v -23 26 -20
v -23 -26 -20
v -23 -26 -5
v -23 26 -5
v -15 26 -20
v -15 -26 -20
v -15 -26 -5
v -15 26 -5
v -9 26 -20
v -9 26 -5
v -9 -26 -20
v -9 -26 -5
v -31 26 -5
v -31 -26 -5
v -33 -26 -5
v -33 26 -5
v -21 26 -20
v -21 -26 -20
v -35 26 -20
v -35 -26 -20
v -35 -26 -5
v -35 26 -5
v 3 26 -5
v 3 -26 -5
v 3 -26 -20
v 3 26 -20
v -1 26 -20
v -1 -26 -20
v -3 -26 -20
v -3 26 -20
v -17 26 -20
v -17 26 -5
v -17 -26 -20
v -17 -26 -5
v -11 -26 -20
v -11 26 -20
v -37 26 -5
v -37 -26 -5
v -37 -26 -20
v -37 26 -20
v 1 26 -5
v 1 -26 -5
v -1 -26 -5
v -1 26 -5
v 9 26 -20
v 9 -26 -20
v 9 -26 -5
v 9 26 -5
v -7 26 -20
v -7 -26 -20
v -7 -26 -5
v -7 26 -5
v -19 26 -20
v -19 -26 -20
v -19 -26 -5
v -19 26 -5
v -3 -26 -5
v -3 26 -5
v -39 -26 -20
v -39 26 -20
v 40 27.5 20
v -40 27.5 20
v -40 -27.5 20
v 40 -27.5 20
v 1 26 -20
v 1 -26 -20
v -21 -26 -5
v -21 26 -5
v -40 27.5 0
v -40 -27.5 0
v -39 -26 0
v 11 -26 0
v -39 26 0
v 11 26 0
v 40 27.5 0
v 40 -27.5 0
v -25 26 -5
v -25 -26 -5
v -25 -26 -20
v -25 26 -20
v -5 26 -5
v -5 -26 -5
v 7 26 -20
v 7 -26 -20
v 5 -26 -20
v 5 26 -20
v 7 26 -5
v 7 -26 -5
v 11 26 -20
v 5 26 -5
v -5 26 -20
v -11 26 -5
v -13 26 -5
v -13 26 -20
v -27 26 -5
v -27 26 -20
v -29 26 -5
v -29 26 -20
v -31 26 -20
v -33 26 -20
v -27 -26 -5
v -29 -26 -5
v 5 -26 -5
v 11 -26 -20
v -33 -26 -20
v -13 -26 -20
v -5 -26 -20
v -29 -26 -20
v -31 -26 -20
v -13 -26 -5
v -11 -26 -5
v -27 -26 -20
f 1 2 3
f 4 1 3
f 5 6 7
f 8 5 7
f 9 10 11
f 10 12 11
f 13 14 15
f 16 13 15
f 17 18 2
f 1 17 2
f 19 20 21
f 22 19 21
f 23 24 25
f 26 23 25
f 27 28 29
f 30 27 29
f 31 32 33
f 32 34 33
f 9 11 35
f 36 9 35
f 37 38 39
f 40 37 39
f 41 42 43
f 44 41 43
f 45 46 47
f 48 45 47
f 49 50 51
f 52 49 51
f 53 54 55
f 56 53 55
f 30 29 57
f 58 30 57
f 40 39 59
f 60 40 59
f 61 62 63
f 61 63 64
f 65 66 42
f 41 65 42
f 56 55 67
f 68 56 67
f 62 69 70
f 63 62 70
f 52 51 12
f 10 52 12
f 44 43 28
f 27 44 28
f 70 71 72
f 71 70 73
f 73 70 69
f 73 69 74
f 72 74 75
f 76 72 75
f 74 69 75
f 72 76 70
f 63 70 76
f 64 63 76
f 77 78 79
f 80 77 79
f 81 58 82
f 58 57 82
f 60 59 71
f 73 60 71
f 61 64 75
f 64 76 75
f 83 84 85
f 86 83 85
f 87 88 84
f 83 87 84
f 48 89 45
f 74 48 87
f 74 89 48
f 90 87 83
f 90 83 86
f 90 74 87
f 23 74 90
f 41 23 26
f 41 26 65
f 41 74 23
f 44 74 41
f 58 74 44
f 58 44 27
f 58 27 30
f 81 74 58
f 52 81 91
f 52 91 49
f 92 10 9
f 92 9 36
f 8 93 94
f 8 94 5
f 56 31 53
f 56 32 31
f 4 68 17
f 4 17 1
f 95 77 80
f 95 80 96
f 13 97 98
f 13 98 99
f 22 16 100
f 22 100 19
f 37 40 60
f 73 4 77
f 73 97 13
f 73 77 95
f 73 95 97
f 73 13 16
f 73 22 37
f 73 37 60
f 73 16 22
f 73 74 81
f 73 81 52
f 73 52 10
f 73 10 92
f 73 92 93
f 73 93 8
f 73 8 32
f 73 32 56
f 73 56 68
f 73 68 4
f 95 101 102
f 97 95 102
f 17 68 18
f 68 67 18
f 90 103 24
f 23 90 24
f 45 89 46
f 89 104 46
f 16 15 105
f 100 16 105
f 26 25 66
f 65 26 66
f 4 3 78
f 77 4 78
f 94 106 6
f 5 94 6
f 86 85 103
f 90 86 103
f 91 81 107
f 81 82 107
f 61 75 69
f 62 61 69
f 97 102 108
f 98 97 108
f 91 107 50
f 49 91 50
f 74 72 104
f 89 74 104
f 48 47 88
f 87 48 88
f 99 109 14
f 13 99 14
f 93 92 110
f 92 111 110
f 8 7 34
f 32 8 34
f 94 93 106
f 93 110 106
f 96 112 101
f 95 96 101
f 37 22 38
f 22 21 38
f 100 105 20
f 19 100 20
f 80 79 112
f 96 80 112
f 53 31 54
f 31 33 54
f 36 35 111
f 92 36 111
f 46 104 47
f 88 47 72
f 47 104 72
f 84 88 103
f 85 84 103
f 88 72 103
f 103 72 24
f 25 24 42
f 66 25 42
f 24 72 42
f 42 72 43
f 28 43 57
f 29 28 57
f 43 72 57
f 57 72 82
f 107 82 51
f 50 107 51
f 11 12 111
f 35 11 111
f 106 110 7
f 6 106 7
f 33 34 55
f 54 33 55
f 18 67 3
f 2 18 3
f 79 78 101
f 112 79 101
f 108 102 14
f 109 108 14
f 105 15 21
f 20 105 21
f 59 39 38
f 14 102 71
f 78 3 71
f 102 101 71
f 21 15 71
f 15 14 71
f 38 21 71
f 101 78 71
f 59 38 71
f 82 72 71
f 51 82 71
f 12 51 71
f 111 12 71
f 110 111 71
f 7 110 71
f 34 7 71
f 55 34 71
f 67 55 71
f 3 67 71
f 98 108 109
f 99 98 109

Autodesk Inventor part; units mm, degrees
ref_plane "YZ Plane" through (0, 0, 0) normal (1, 0, 0) x (0, 1, 0)
ref_plane "XZ Plane" through (0, 0, 0) normal (0, 1, 0) x (-1, 0, 0)
ref_plane "XY Plane" through (0, 0, 0) normal (0, 0, 1) x (1, 0, 0)
sketch "Szkic1" plane through (0, 0, 0) normal (0, 0, 1) x (1, 0, 0)
  line L0 (-40, -27.5) -> (40, -27.5)
  line L1 (40, -27.5) -> (40, 27.5)
  line L2 (40, 27.5) -> (-40, 27.5)
  line L3 (-40, 27.5) -> (-40, -27.5)
  line L4 (-40, -27.5) -> (40, 27.5) construction
  line L5 (40, -27.5) -> (-40, 27.5) construction
  point P0 (0, 0)
  dimension "d0" = 80
  dimension "d1" = 55
extrude "Wyciągnięcie proste1" add sketch "Szkic1" along normal blind 20
sketch "Szkic2" plane through (0, 0, 0) normal (0, 1, 0) x (-1, 0, 0)
  line L0 (39, 0) -> (-11, 0)
  line L1 (-11, 0) -> (-11, -20)
  line L2 (-11, -20) -> (39, -20)
  line L3 (39, -20) -> (39, 0)
  line L4 (40, 0) -> (40, 20) projected
  line L5 (40, 0) -> (-40, 0) projected
  point P0 (0, 0)
  dimension "d4" = 50
  dimension "d5" = 20
  dimension "d6" = 1
extrude "Wyciągnięcie proste2" add sketch "Szkic2" along normal mid plane 52
sketch "Szkic3" plane through (0, -26, 0) normal (0, -1, 0) x (1, 0, 0)
  line L0 (11, -20) -> (-39, -20) projected
  line L1 (-37, -20) -> (-35, -20)
  line L2 (-35, -20) -> (-35, -5)
  line L3 (-35, -5) -> (-37, -5)
  line L4 (-37, -5) -> (-37, -20)
  line L5 (-39, 0) -> (-39, -20) projected
  line L6 (-33, -20) -> (-31, -20)
  line L7 (-31, -20) -> (-31, -5)
  line L8 (-31, -5) -> (-33, -5)
  line L9 (-33, -5) -> (-33, -20)
  line L10 (-29, -20) -> (-27, -20)
  line L11 (-27, -20) -> (-27, -5)
  line L12 (-27, -5) -> (-29, -5)
  line L13 (-29, -5) -> (-29, -20)
  line L14 (-25, -20) -> (-23, -20)
  line L15 (-23, -20) -> (-23, -5)
  line L16 (-23, -5) -> (-25, -5)
  line L17 (-25, -5) -> (-25, -20)
  line L18 (-21, -20) -> (-19, -20)
  line L19 (-19, -20) -> (-19, -5)
  line L20 (-19, -5) -> (-21, -5)
  line L21 (-21, -5) -> (-21, -20)
  line L22 (-17, -20) -> (-15, -20)
  line L23 (-15, -20) -> (-15, -5)
  line L24 (-15, -5) -> (-17, -5)
  line L25 (-17, -5) -> (-17, -20)
  line L26 (-13, -20) -> (-11, -20)
  line L27 (-11, -20) -> (-11, -5)
  line L28 (-11, -5) -> (-13, -5)
  line L29 (-13, -5) -> (-13, -20)
  line L30 (-9, -20) -> (-7, -20)
  line L31 (-7, -20) -> (-7, -5)
  line L32 (-7, -5) -> (-9, -5)
  line L33 (-9, -5) -> (-9, -20)
  line L34 (-5, -20) -> (-3, -20)
  line L35 (-3, -20) -> (-3, -5)
  line L36 (-3, -5) -> (-5, -5)
  line L37 (-5, -5) -> (-5, -20)
  line L38 (-1, -20) -> (1, -20)
  line L39 (1, -20) -> (1, -5)
  line L40 (1, -5) -> (-1, -5)
  line L41 (-1, -5) -> (-1, -20)
  line L42 (3, -20) -> (5, -20)
  line L43 (5, -20) -> (5, -5)
  line L44 (5, -5) -> (3, -5)
  line L45 (3, -5) -> (3, -20)
  line L46 (7, -20) -> (9, -20)
  line L47 (9, -20) -> (9, -5)
  line L48 (9, -5) -> (7, -5)
  line L49 (7, -5) -> (7, -20)
  point P0 (0, 0)
  dimension "d9" = 2
  dimension "d10" = 15
  dimension "d11" = 2
  dimension "d14" = 4
extrude "Wyciągnięcie proste3" cut sketch "Szkic3" against normal blind 52
properties part number "stepper_driver"
